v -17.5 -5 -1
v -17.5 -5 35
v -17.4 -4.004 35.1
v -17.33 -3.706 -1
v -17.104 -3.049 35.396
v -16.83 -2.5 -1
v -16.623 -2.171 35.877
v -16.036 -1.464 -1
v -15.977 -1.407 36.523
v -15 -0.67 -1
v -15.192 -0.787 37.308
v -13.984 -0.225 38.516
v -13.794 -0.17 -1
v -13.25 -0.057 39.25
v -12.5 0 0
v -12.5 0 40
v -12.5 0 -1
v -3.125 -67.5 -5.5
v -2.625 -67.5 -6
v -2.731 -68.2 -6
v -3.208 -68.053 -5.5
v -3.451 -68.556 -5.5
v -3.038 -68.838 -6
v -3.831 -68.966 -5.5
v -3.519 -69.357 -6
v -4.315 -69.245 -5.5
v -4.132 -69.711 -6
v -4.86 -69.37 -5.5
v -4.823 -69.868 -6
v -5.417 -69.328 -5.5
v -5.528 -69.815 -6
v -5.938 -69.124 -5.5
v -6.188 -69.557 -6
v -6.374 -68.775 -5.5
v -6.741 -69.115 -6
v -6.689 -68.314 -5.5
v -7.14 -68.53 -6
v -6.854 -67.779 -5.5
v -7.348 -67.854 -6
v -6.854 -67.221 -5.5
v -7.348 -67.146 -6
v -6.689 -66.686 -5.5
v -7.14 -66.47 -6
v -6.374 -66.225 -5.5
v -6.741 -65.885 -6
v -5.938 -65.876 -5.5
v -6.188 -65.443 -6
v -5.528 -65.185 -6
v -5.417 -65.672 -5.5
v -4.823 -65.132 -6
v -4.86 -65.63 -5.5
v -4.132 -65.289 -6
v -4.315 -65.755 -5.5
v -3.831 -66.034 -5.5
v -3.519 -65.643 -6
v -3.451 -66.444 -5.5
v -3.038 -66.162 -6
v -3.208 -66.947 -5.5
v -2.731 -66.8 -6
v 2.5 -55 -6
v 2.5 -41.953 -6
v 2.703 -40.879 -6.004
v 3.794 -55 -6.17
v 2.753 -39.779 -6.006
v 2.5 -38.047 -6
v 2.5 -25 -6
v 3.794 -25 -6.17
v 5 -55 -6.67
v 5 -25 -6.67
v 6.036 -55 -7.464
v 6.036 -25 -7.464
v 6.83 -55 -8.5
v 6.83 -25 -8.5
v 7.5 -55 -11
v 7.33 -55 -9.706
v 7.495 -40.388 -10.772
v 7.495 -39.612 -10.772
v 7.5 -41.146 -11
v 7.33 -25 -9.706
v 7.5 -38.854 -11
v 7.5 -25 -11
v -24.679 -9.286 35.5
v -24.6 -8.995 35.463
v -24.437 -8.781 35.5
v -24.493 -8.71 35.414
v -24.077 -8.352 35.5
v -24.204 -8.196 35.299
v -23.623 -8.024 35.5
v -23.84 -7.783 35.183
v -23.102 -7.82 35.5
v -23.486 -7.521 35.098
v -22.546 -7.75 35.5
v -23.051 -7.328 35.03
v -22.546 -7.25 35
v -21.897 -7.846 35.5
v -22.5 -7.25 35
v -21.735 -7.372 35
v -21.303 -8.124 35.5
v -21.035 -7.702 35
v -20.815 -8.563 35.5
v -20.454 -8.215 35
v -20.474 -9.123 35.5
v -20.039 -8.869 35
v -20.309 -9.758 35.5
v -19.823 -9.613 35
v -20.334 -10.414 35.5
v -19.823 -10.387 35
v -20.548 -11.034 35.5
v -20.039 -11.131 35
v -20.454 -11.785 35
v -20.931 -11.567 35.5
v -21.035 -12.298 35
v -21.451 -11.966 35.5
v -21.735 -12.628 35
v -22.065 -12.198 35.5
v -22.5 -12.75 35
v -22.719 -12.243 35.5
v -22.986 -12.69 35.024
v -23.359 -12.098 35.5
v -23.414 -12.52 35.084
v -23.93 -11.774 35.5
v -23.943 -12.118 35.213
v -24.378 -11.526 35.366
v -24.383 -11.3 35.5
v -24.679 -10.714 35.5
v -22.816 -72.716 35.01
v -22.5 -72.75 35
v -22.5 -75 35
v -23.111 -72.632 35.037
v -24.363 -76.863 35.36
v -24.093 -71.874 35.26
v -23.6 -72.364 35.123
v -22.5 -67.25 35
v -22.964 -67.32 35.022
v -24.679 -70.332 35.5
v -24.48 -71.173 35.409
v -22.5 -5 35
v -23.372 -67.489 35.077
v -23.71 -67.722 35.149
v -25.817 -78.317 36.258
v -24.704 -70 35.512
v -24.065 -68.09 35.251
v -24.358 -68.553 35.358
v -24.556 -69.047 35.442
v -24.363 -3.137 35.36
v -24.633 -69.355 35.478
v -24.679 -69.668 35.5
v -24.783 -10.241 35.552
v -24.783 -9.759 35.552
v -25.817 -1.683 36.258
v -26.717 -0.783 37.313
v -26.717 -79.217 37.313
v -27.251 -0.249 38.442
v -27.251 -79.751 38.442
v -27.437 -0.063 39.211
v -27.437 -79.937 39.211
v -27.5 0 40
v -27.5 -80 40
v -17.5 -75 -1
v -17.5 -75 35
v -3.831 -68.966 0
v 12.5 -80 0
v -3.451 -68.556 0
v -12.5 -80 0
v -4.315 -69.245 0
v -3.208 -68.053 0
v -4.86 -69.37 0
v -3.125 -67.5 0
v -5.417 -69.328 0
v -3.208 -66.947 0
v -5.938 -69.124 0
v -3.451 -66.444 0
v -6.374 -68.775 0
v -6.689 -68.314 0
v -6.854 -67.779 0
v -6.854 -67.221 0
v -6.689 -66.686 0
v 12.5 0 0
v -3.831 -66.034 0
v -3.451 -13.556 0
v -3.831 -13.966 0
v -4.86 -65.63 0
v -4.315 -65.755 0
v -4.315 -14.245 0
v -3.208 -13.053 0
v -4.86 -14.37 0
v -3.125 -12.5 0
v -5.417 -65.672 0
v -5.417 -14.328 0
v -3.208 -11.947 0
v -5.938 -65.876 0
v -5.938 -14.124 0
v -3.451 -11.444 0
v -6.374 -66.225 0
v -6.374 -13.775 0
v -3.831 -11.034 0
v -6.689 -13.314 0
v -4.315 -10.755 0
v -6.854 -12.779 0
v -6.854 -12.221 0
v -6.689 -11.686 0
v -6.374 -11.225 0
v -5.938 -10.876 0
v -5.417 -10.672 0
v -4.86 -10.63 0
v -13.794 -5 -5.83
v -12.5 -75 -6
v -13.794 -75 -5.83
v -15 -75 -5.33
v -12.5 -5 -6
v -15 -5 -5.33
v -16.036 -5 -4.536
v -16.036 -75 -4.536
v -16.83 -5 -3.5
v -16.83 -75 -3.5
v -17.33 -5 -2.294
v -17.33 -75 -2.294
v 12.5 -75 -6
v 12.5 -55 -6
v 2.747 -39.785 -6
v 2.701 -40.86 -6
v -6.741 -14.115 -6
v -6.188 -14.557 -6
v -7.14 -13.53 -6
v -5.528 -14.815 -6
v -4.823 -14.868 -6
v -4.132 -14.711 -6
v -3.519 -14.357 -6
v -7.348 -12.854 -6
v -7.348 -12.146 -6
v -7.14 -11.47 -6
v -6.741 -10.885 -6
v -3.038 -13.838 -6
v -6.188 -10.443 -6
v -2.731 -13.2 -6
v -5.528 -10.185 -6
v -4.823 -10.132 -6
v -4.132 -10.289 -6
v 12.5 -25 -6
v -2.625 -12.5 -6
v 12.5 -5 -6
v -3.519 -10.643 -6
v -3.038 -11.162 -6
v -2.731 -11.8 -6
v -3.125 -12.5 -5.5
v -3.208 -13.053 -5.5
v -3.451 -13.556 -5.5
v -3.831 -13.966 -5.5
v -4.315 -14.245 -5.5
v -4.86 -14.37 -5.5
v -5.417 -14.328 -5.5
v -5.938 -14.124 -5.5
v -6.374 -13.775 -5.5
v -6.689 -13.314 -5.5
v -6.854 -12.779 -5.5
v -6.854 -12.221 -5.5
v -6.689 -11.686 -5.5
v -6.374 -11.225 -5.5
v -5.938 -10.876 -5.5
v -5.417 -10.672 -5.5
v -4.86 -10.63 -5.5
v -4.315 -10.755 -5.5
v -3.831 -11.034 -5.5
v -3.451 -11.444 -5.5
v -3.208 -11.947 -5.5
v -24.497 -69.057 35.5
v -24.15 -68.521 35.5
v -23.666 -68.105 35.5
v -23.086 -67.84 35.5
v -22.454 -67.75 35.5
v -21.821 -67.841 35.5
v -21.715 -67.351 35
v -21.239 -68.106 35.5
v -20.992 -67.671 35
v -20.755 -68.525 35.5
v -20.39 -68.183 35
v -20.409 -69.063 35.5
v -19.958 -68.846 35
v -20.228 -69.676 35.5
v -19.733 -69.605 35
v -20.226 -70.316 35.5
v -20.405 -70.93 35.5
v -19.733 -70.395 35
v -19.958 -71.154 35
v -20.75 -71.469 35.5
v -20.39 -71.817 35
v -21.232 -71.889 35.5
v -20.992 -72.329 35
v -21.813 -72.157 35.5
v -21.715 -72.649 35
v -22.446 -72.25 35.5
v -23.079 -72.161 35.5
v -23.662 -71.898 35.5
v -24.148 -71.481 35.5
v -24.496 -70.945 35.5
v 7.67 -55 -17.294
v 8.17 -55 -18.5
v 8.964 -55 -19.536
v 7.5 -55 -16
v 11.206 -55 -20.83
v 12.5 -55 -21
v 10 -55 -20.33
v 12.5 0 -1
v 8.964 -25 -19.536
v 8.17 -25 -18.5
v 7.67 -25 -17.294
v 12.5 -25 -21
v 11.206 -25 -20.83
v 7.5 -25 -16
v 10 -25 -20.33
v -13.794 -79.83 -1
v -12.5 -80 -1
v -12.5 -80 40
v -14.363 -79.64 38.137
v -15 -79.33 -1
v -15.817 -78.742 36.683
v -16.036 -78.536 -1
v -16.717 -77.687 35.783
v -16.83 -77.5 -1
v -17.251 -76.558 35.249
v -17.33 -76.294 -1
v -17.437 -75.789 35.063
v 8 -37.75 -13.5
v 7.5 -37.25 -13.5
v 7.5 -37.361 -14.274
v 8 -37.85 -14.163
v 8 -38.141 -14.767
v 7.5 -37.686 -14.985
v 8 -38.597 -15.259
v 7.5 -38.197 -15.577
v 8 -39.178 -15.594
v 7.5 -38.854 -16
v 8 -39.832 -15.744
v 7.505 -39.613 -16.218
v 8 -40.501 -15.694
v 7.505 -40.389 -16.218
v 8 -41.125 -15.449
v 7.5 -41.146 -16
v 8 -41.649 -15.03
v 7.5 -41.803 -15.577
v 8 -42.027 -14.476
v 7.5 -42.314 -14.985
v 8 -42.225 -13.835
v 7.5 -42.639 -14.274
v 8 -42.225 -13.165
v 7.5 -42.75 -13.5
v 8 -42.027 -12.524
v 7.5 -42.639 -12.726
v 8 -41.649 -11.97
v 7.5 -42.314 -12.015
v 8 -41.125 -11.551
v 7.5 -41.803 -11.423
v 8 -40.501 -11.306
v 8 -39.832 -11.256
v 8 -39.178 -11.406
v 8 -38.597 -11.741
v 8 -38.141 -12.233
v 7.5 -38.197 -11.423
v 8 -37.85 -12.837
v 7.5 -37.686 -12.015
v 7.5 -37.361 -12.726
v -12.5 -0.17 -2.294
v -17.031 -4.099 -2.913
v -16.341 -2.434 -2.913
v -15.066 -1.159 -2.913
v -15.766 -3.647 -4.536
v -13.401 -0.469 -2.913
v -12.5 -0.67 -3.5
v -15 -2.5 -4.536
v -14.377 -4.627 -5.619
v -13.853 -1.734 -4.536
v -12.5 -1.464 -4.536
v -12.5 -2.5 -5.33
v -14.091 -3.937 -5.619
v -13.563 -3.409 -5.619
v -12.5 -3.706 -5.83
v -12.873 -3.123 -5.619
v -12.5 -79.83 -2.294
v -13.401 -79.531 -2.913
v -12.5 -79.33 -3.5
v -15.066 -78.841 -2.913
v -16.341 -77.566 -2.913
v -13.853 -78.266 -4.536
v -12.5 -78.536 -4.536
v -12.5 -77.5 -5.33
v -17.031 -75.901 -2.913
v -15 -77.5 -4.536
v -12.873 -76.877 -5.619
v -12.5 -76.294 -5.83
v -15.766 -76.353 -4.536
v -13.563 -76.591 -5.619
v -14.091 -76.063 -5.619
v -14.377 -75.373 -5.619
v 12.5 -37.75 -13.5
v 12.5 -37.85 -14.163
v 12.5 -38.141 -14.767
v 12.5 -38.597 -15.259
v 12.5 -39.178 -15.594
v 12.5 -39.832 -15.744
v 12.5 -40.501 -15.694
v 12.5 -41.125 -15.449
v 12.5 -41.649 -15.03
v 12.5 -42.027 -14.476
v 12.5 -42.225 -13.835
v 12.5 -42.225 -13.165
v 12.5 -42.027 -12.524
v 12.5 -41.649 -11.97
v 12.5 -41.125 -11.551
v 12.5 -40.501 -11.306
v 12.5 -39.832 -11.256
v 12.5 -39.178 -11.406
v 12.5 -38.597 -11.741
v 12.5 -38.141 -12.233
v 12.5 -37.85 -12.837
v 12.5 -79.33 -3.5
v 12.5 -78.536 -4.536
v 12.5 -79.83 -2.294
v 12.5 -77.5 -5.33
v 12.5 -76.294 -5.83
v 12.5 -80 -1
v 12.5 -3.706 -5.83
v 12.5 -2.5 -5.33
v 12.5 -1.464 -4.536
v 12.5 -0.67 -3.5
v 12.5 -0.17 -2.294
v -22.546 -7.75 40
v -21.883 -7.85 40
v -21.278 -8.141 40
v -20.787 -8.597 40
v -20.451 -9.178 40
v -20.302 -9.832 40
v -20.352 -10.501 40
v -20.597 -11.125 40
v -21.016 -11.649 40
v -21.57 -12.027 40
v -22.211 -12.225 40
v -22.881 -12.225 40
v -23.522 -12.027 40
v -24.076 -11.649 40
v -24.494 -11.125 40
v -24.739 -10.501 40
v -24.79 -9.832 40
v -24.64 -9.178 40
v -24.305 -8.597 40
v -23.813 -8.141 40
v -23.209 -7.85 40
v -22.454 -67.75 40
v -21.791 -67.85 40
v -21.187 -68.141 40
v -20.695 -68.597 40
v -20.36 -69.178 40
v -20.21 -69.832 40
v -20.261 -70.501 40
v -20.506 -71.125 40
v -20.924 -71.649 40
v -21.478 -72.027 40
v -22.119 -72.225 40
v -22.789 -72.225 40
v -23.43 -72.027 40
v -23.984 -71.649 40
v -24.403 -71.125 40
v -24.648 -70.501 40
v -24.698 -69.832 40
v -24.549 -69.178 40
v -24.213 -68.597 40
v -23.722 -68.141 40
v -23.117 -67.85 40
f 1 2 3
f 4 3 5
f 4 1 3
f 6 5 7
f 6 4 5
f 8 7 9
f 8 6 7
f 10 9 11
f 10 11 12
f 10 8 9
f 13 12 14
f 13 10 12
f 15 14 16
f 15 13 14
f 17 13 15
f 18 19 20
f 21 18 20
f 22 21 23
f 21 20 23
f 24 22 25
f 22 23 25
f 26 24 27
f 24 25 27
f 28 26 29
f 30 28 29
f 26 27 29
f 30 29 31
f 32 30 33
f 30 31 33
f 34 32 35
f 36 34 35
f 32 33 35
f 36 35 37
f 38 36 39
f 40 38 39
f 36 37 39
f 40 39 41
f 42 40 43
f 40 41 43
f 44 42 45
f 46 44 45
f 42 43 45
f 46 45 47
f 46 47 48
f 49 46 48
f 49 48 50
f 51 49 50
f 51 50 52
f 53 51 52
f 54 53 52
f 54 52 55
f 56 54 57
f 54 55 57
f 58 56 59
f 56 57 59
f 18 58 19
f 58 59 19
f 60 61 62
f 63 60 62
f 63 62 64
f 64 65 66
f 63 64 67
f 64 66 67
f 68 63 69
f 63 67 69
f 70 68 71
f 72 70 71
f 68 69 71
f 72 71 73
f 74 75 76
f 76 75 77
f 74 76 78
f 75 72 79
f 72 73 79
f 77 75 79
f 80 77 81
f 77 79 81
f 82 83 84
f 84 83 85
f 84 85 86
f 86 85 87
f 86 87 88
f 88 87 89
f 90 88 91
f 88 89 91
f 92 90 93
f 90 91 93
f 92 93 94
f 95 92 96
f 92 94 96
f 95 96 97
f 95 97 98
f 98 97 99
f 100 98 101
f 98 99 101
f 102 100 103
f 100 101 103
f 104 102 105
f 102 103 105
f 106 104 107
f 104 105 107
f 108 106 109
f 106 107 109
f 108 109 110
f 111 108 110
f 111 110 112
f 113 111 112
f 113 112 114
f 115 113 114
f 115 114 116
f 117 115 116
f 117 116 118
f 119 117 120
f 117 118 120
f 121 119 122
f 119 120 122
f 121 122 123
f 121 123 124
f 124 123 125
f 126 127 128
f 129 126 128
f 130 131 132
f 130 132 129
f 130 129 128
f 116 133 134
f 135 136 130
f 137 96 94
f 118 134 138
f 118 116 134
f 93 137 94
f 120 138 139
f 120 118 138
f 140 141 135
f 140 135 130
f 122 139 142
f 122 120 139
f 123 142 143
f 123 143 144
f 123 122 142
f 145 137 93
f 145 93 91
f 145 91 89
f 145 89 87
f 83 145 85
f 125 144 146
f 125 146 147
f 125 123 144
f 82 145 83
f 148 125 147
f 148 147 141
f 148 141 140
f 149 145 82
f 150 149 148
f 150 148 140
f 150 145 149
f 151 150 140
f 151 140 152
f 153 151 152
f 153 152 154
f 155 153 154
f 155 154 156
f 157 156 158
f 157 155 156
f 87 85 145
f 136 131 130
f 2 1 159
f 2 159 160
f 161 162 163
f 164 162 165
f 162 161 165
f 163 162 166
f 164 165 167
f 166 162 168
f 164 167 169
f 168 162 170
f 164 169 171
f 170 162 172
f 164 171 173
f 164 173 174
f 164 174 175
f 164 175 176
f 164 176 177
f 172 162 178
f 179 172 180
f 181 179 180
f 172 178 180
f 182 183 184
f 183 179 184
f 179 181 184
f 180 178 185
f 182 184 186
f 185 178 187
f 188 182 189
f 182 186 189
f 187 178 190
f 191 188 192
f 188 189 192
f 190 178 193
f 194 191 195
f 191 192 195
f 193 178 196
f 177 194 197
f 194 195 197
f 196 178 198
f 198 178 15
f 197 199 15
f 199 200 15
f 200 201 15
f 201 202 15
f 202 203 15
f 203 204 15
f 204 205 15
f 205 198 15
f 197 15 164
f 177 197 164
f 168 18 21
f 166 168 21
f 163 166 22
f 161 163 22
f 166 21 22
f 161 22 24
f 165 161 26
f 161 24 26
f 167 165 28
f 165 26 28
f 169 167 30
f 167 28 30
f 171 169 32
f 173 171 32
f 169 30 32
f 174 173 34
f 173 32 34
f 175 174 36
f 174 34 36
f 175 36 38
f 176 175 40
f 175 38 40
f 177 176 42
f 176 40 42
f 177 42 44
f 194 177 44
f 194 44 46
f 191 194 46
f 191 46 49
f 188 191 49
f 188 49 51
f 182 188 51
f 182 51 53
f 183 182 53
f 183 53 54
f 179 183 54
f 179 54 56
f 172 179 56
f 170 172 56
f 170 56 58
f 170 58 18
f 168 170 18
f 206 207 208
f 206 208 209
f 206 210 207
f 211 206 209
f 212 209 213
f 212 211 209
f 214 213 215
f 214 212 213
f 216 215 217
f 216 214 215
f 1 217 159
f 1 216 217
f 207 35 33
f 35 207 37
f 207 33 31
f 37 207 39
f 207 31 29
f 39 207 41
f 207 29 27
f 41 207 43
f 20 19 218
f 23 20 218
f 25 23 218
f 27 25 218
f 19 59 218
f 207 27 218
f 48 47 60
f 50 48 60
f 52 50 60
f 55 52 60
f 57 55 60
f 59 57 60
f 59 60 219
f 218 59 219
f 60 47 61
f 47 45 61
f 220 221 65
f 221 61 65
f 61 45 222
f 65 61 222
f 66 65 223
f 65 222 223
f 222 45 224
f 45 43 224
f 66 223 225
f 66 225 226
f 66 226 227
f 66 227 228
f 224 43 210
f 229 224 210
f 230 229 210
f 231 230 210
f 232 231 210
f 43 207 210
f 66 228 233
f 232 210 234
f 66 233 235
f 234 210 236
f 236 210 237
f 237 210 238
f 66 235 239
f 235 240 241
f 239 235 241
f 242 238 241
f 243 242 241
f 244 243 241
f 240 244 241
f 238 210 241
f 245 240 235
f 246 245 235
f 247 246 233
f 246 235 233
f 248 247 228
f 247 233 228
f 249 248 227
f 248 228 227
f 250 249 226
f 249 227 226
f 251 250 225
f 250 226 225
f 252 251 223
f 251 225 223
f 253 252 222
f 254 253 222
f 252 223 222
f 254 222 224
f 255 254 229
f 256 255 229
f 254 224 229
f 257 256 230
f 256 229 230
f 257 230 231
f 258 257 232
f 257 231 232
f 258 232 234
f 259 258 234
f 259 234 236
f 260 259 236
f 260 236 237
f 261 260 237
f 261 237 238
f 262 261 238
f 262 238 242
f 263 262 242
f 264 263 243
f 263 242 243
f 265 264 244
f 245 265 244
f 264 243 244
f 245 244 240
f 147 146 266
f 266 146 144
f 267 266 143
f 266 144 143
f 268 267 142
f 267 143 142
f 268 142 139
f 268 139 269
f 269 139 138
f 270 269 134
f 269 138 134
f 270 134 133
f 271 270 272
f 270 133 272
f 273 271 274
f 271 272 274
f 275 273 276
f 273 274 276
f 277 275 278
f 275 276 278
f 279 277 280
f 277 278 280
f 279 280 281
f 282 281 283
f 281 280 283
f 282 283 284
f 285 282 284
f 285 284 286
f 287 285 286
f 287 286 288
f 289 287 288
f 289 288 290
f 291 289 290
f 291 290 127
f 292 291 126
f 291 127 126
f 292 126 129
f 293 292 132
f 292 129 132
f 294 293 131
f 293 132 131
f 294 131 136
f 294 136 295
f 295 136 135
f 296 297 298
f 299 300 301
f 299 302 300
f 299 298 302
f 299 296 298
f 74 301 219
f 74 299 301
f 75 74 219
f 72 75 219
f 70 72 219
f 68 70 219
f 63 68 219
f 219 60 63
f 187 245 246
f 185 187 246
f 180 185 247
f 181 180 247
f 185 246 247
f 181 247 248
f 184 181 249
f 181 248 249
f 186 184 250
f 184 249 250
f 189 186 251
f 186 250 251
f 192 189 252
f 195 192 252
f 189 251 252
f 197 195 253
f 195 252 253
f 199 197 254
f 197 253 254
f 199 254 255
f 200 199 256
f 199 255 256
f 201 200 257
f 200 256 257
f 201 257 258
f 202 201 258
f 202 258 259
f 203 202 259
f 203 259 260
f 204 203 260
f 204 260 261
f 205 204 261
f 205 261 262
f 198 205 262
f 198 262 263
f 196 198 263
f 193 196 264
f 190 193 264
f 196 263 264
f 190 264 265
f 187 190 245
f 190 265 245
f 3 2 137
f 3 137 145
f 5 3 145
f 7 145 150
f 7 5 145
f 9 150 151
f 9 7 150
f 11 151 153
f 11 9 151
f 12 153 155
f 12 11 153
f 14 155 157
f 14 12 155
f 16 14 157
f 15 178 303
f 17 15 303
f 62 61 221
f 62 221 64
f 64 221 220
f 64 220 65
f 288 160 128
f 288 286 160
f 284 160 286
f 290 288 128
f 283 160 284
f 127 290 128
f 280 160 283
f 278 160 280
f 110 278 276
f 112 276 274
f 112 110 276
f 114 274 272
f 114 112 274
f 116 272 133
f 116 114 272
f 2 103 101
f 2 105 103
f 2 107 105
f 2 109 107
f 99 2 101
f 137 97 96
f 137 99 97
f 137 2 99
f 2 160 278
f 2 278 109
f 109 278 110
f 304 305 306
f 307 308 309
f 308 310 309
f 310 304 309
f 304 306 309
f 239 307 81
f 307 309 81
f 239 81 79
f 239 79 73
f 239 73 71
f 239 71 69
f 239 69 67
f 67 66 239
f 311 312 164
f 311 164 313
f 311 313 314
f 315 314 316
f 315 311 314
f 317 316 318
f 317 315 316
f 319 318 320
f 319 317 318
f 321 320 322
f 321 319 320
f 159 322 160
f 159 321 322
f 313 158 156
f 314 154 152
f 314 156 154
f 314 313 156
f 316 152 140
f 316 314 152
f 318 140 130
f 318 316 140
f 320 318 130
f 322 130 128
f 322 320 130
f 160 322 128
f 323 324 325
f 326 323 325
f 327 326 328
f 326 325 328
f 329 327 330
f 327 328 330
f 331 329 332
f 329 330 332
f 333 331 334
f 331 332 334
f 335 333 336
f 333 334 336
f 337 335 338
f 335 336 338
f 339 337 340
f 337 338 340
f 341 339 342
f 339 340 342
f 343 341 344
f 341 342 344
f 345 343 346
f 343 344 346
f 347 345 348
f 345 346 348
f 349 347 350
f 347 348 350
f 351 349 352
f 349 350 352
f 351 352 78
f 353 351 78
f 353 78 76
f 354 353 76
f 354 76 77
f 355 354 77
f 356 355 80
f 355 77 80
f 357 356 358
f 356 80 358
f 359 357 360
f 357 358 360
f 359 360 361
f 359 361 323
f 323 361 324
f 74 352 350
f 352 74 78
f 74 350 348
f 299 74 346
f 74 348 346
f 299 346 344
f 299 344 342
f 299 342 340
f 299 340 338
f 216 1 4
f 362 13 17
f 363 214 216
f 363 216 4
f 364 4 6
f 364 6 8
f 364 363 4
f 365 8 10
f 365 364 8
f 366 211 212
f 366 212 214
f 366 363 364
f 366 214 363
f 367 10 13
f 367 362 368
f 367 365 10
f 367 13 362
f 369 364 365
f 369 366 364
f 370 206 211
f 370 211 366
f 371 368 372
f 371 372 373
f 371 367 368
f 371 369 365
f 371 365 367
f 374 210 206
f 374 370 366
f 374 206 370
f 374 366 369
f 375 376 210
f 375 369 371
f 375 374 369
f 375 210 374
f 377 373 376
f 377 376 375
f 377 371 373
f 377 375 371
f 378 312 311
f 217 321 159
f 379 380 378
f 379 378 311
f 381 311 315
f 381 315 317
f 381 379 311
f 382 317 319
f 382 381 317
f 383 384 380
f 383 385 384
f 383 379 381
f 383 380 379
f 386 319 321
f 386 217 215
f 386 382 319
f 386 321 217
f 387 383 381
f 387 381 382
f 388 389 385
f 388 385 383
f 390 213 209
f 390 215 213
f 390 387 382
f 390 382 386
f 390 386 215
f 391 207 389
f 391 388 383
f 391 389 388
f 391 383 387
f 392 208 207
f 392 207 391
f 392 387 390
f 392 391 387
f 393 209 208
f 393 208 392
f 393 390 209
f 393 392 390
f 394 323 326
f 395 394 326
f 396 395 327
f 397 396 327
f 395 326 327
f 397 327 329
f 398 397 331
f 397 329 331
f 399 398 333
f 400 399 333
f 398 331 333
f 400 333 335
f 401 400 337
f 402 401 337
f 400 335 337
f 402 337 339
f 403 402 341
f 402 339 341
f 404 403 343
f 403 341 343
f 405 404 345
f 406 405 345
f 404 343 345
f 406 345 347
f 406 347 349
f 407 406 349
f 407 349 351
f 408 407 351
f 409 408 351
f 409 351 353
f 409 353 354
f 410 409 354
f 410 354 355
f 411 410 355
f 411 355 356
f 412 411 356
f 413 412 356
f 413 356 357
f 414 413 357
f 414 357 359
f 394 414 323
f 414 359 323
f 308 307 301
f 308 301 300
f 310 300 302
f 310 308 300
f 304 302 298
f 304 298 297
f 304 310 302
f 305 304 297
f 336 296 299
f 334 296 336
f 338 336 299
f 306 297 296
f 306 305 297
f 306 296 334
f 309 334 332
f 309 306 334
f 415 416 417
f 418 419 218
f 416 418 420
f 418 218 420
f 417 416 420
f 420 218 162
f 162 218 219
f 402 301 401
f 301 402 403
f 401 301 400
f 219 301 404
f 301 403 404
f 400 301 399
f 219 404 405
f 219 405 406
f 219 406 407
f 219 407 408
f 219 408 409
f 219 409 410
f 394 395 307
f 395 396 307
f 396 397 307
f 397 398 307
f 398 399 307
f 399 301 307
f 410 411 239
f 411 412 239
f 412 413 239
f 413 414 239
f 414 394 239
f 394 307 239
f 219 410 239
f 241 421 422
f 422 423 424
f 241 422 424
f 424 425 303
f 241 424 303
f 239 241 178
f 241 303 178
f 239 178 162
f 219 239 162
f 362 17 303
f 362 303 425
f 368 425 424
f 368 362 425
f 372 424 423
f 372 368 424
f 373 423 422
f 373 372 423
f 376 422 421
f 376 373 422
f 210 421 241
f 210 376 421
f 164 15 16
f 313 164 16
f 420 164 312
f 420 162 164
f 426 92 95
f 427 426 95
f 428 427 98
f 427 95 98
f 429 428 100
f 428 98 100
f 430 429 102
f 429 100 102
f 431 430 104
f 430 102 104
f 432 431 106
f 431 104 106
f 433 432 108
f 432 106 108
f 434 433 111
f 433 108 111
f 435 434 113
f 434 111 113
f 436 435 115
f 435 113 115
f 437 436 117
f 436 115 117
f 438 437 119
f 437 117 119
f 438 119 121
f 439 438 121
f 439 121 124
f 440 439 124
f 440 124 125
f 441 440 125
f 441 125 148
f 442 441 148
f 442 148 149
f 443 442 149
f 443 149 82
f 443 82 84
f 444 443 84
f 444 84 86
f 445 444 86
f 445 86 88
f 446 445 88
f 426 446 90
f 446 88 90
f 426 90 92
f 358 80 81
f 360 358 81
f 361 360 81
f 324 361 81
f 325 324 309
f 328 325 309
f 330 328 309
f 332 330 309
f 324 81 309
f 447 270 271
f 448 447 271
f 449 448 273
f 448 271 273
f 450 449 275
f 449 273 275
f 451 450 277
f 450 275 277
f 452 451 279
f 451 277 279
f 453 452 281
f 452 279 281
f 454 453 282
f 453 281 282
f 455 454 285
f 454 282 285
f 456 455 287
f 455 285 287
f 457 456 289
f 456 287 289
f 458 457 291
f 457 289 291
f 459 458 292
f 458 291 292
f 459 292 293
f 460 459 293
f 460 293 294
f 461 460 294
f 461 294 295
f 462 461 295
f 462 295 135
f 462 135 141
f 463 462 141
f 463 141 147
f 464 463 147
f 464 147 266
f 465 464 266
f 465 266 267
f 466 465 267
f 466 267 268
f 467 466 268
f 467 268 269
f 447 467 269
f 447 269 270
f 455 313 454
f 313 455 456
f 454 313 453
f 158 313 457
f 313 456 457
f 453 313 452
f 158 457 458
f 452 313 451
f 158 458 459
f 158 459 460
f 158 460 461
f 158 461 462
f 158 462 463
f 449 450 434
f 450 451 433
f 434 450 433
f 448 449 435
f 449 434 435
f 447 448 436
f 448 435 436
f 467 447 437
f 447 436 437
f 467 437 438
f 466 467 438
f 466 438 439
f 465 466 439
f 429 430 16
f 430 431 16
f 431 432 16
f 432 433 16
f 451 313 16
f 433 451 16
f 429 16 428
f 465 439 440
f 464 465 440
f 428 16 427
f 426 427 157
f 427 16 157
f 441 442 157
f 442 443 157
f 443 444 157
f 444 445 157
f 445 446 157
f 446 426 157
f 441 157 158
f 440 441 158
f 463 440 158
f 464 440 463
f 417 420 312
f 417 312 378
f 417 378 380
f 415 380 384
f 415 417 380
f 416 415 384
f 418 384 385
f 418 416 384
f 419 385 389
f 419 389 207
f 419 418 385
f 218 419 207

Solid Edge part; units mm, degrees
sketch "Sketch1" plane through (0, 0, 0) normal (0, -1, 0) x (1, 0, 0)
  line L0 (-17.5, -6) -> (7.5, -6)
  line L1 (7.5, -6) -> (7.5, -21)
  line L2 (7.5, -21) -> (12.5, -21)
  line L3 (12.5, -21) -> (12.5, 0)
  line L4 (12.5, 0) -> (-12.5, 0)
  line L5 (-12.5, 0) -> (-12.5, 40)
  line L6 (-12.5, 40) -> (-27.5, 40)
  line L7 (-27.5, 35) -> (-27.5, 40)
  line L8 (-17.5, 35) -> (-27.5, 35)
  line L9 (-17.5, -6) -> (-17.5, 35)
  dimension "D1" = 5
  dimension "D2" = 6
  dimension "D3" = 15
  dimension "D4" = 40
  dimension "D5" = 10
  dimension "D6" = 40
  dimension "D7" = 5
  dimension "D8" = 5
extrude "Protrusion1" add sketch "Sketch1" along normal blind 80
sketch "Sketch2" plane through (7.5, -40, -13.5) normal (-1, 0, 0) x (0, 1, 0)
  circle A0 centre (0, 0) radius 2.25
extrude "Cutout1" cut sketch "Sketch2" against normal through all
sketch "Sketch3" plane through (-22.5, -40, 35) normal (0, 0, -1) x (0, 1, 0)
  circle A0 centre (-30, 0.0459) radius 2.25
  circle A1 centre (30, -0.0459) radius 2.25
  dimension "D1" = 60
  dimension "D2" = 4.5
extrude "Cutout2" cut sketch "Sketch3" against normal through all
sketch "Sketch4" plane through (-5, -40, -6) normal (0, 0, -1) x (1, 0, 0)
  circle A0 centre (0, 27.5) radius 1.875
  circle A1 centre (0, -27.5) radius 1.875
  dimension "D1" = 55
extrude "Cutout3" cut sketch "Sketch4" against normal through all
sketch "Sketch5" plane through (7.5, -40, -13.5) normal (-1, 0, 0) x (0, 1, 0)
  line L0 (-40, 7.5) -> (-15, 7.5)
  line L1 (-15, 7.5) -> (-15, -7.5)
  line L2 (-15, -7.5) -> (-40, -7.5)
  line L3 (-40, -7.5) -> (-40, 7.5)
  line L4 (40, 7.5) -> (15, 7.5)
  line L5 (15, 7.5) -> (15, -7.5)
  line L6 (15, -7.5) -> (40, -7.5)
  line L7 (40, -7.5) -> (40, 7.5)
  dimension "D1" = 25
extrude "Cutout4" cut sketch "Sketch5" against normal through all
chamfer "Fase_3" distance 0.5 angle 45 5 edges at (-6.875, -67.5, -6) (-6.875, -12.5, -6) (-22.5459, -12.25, 35) (-22.4541, -72.25, 35) (7.5, -42.25, -13.5)
fillet "Verrundung_3" radius 5 10 edges at (-27.5, -40, 35) (-17.5, -40, -6) (7.5, -40, -6) (7.5, -40, -21) (-17.5, -80, 14.5) (-2.5, -80, -6) (-22.5, -80, 35) (-17.5, 0, 14.5) (-22.5, 0, 35) (-2.5, 0, -6)
properties part number "A7.3" material "Nylon, allgemein"
